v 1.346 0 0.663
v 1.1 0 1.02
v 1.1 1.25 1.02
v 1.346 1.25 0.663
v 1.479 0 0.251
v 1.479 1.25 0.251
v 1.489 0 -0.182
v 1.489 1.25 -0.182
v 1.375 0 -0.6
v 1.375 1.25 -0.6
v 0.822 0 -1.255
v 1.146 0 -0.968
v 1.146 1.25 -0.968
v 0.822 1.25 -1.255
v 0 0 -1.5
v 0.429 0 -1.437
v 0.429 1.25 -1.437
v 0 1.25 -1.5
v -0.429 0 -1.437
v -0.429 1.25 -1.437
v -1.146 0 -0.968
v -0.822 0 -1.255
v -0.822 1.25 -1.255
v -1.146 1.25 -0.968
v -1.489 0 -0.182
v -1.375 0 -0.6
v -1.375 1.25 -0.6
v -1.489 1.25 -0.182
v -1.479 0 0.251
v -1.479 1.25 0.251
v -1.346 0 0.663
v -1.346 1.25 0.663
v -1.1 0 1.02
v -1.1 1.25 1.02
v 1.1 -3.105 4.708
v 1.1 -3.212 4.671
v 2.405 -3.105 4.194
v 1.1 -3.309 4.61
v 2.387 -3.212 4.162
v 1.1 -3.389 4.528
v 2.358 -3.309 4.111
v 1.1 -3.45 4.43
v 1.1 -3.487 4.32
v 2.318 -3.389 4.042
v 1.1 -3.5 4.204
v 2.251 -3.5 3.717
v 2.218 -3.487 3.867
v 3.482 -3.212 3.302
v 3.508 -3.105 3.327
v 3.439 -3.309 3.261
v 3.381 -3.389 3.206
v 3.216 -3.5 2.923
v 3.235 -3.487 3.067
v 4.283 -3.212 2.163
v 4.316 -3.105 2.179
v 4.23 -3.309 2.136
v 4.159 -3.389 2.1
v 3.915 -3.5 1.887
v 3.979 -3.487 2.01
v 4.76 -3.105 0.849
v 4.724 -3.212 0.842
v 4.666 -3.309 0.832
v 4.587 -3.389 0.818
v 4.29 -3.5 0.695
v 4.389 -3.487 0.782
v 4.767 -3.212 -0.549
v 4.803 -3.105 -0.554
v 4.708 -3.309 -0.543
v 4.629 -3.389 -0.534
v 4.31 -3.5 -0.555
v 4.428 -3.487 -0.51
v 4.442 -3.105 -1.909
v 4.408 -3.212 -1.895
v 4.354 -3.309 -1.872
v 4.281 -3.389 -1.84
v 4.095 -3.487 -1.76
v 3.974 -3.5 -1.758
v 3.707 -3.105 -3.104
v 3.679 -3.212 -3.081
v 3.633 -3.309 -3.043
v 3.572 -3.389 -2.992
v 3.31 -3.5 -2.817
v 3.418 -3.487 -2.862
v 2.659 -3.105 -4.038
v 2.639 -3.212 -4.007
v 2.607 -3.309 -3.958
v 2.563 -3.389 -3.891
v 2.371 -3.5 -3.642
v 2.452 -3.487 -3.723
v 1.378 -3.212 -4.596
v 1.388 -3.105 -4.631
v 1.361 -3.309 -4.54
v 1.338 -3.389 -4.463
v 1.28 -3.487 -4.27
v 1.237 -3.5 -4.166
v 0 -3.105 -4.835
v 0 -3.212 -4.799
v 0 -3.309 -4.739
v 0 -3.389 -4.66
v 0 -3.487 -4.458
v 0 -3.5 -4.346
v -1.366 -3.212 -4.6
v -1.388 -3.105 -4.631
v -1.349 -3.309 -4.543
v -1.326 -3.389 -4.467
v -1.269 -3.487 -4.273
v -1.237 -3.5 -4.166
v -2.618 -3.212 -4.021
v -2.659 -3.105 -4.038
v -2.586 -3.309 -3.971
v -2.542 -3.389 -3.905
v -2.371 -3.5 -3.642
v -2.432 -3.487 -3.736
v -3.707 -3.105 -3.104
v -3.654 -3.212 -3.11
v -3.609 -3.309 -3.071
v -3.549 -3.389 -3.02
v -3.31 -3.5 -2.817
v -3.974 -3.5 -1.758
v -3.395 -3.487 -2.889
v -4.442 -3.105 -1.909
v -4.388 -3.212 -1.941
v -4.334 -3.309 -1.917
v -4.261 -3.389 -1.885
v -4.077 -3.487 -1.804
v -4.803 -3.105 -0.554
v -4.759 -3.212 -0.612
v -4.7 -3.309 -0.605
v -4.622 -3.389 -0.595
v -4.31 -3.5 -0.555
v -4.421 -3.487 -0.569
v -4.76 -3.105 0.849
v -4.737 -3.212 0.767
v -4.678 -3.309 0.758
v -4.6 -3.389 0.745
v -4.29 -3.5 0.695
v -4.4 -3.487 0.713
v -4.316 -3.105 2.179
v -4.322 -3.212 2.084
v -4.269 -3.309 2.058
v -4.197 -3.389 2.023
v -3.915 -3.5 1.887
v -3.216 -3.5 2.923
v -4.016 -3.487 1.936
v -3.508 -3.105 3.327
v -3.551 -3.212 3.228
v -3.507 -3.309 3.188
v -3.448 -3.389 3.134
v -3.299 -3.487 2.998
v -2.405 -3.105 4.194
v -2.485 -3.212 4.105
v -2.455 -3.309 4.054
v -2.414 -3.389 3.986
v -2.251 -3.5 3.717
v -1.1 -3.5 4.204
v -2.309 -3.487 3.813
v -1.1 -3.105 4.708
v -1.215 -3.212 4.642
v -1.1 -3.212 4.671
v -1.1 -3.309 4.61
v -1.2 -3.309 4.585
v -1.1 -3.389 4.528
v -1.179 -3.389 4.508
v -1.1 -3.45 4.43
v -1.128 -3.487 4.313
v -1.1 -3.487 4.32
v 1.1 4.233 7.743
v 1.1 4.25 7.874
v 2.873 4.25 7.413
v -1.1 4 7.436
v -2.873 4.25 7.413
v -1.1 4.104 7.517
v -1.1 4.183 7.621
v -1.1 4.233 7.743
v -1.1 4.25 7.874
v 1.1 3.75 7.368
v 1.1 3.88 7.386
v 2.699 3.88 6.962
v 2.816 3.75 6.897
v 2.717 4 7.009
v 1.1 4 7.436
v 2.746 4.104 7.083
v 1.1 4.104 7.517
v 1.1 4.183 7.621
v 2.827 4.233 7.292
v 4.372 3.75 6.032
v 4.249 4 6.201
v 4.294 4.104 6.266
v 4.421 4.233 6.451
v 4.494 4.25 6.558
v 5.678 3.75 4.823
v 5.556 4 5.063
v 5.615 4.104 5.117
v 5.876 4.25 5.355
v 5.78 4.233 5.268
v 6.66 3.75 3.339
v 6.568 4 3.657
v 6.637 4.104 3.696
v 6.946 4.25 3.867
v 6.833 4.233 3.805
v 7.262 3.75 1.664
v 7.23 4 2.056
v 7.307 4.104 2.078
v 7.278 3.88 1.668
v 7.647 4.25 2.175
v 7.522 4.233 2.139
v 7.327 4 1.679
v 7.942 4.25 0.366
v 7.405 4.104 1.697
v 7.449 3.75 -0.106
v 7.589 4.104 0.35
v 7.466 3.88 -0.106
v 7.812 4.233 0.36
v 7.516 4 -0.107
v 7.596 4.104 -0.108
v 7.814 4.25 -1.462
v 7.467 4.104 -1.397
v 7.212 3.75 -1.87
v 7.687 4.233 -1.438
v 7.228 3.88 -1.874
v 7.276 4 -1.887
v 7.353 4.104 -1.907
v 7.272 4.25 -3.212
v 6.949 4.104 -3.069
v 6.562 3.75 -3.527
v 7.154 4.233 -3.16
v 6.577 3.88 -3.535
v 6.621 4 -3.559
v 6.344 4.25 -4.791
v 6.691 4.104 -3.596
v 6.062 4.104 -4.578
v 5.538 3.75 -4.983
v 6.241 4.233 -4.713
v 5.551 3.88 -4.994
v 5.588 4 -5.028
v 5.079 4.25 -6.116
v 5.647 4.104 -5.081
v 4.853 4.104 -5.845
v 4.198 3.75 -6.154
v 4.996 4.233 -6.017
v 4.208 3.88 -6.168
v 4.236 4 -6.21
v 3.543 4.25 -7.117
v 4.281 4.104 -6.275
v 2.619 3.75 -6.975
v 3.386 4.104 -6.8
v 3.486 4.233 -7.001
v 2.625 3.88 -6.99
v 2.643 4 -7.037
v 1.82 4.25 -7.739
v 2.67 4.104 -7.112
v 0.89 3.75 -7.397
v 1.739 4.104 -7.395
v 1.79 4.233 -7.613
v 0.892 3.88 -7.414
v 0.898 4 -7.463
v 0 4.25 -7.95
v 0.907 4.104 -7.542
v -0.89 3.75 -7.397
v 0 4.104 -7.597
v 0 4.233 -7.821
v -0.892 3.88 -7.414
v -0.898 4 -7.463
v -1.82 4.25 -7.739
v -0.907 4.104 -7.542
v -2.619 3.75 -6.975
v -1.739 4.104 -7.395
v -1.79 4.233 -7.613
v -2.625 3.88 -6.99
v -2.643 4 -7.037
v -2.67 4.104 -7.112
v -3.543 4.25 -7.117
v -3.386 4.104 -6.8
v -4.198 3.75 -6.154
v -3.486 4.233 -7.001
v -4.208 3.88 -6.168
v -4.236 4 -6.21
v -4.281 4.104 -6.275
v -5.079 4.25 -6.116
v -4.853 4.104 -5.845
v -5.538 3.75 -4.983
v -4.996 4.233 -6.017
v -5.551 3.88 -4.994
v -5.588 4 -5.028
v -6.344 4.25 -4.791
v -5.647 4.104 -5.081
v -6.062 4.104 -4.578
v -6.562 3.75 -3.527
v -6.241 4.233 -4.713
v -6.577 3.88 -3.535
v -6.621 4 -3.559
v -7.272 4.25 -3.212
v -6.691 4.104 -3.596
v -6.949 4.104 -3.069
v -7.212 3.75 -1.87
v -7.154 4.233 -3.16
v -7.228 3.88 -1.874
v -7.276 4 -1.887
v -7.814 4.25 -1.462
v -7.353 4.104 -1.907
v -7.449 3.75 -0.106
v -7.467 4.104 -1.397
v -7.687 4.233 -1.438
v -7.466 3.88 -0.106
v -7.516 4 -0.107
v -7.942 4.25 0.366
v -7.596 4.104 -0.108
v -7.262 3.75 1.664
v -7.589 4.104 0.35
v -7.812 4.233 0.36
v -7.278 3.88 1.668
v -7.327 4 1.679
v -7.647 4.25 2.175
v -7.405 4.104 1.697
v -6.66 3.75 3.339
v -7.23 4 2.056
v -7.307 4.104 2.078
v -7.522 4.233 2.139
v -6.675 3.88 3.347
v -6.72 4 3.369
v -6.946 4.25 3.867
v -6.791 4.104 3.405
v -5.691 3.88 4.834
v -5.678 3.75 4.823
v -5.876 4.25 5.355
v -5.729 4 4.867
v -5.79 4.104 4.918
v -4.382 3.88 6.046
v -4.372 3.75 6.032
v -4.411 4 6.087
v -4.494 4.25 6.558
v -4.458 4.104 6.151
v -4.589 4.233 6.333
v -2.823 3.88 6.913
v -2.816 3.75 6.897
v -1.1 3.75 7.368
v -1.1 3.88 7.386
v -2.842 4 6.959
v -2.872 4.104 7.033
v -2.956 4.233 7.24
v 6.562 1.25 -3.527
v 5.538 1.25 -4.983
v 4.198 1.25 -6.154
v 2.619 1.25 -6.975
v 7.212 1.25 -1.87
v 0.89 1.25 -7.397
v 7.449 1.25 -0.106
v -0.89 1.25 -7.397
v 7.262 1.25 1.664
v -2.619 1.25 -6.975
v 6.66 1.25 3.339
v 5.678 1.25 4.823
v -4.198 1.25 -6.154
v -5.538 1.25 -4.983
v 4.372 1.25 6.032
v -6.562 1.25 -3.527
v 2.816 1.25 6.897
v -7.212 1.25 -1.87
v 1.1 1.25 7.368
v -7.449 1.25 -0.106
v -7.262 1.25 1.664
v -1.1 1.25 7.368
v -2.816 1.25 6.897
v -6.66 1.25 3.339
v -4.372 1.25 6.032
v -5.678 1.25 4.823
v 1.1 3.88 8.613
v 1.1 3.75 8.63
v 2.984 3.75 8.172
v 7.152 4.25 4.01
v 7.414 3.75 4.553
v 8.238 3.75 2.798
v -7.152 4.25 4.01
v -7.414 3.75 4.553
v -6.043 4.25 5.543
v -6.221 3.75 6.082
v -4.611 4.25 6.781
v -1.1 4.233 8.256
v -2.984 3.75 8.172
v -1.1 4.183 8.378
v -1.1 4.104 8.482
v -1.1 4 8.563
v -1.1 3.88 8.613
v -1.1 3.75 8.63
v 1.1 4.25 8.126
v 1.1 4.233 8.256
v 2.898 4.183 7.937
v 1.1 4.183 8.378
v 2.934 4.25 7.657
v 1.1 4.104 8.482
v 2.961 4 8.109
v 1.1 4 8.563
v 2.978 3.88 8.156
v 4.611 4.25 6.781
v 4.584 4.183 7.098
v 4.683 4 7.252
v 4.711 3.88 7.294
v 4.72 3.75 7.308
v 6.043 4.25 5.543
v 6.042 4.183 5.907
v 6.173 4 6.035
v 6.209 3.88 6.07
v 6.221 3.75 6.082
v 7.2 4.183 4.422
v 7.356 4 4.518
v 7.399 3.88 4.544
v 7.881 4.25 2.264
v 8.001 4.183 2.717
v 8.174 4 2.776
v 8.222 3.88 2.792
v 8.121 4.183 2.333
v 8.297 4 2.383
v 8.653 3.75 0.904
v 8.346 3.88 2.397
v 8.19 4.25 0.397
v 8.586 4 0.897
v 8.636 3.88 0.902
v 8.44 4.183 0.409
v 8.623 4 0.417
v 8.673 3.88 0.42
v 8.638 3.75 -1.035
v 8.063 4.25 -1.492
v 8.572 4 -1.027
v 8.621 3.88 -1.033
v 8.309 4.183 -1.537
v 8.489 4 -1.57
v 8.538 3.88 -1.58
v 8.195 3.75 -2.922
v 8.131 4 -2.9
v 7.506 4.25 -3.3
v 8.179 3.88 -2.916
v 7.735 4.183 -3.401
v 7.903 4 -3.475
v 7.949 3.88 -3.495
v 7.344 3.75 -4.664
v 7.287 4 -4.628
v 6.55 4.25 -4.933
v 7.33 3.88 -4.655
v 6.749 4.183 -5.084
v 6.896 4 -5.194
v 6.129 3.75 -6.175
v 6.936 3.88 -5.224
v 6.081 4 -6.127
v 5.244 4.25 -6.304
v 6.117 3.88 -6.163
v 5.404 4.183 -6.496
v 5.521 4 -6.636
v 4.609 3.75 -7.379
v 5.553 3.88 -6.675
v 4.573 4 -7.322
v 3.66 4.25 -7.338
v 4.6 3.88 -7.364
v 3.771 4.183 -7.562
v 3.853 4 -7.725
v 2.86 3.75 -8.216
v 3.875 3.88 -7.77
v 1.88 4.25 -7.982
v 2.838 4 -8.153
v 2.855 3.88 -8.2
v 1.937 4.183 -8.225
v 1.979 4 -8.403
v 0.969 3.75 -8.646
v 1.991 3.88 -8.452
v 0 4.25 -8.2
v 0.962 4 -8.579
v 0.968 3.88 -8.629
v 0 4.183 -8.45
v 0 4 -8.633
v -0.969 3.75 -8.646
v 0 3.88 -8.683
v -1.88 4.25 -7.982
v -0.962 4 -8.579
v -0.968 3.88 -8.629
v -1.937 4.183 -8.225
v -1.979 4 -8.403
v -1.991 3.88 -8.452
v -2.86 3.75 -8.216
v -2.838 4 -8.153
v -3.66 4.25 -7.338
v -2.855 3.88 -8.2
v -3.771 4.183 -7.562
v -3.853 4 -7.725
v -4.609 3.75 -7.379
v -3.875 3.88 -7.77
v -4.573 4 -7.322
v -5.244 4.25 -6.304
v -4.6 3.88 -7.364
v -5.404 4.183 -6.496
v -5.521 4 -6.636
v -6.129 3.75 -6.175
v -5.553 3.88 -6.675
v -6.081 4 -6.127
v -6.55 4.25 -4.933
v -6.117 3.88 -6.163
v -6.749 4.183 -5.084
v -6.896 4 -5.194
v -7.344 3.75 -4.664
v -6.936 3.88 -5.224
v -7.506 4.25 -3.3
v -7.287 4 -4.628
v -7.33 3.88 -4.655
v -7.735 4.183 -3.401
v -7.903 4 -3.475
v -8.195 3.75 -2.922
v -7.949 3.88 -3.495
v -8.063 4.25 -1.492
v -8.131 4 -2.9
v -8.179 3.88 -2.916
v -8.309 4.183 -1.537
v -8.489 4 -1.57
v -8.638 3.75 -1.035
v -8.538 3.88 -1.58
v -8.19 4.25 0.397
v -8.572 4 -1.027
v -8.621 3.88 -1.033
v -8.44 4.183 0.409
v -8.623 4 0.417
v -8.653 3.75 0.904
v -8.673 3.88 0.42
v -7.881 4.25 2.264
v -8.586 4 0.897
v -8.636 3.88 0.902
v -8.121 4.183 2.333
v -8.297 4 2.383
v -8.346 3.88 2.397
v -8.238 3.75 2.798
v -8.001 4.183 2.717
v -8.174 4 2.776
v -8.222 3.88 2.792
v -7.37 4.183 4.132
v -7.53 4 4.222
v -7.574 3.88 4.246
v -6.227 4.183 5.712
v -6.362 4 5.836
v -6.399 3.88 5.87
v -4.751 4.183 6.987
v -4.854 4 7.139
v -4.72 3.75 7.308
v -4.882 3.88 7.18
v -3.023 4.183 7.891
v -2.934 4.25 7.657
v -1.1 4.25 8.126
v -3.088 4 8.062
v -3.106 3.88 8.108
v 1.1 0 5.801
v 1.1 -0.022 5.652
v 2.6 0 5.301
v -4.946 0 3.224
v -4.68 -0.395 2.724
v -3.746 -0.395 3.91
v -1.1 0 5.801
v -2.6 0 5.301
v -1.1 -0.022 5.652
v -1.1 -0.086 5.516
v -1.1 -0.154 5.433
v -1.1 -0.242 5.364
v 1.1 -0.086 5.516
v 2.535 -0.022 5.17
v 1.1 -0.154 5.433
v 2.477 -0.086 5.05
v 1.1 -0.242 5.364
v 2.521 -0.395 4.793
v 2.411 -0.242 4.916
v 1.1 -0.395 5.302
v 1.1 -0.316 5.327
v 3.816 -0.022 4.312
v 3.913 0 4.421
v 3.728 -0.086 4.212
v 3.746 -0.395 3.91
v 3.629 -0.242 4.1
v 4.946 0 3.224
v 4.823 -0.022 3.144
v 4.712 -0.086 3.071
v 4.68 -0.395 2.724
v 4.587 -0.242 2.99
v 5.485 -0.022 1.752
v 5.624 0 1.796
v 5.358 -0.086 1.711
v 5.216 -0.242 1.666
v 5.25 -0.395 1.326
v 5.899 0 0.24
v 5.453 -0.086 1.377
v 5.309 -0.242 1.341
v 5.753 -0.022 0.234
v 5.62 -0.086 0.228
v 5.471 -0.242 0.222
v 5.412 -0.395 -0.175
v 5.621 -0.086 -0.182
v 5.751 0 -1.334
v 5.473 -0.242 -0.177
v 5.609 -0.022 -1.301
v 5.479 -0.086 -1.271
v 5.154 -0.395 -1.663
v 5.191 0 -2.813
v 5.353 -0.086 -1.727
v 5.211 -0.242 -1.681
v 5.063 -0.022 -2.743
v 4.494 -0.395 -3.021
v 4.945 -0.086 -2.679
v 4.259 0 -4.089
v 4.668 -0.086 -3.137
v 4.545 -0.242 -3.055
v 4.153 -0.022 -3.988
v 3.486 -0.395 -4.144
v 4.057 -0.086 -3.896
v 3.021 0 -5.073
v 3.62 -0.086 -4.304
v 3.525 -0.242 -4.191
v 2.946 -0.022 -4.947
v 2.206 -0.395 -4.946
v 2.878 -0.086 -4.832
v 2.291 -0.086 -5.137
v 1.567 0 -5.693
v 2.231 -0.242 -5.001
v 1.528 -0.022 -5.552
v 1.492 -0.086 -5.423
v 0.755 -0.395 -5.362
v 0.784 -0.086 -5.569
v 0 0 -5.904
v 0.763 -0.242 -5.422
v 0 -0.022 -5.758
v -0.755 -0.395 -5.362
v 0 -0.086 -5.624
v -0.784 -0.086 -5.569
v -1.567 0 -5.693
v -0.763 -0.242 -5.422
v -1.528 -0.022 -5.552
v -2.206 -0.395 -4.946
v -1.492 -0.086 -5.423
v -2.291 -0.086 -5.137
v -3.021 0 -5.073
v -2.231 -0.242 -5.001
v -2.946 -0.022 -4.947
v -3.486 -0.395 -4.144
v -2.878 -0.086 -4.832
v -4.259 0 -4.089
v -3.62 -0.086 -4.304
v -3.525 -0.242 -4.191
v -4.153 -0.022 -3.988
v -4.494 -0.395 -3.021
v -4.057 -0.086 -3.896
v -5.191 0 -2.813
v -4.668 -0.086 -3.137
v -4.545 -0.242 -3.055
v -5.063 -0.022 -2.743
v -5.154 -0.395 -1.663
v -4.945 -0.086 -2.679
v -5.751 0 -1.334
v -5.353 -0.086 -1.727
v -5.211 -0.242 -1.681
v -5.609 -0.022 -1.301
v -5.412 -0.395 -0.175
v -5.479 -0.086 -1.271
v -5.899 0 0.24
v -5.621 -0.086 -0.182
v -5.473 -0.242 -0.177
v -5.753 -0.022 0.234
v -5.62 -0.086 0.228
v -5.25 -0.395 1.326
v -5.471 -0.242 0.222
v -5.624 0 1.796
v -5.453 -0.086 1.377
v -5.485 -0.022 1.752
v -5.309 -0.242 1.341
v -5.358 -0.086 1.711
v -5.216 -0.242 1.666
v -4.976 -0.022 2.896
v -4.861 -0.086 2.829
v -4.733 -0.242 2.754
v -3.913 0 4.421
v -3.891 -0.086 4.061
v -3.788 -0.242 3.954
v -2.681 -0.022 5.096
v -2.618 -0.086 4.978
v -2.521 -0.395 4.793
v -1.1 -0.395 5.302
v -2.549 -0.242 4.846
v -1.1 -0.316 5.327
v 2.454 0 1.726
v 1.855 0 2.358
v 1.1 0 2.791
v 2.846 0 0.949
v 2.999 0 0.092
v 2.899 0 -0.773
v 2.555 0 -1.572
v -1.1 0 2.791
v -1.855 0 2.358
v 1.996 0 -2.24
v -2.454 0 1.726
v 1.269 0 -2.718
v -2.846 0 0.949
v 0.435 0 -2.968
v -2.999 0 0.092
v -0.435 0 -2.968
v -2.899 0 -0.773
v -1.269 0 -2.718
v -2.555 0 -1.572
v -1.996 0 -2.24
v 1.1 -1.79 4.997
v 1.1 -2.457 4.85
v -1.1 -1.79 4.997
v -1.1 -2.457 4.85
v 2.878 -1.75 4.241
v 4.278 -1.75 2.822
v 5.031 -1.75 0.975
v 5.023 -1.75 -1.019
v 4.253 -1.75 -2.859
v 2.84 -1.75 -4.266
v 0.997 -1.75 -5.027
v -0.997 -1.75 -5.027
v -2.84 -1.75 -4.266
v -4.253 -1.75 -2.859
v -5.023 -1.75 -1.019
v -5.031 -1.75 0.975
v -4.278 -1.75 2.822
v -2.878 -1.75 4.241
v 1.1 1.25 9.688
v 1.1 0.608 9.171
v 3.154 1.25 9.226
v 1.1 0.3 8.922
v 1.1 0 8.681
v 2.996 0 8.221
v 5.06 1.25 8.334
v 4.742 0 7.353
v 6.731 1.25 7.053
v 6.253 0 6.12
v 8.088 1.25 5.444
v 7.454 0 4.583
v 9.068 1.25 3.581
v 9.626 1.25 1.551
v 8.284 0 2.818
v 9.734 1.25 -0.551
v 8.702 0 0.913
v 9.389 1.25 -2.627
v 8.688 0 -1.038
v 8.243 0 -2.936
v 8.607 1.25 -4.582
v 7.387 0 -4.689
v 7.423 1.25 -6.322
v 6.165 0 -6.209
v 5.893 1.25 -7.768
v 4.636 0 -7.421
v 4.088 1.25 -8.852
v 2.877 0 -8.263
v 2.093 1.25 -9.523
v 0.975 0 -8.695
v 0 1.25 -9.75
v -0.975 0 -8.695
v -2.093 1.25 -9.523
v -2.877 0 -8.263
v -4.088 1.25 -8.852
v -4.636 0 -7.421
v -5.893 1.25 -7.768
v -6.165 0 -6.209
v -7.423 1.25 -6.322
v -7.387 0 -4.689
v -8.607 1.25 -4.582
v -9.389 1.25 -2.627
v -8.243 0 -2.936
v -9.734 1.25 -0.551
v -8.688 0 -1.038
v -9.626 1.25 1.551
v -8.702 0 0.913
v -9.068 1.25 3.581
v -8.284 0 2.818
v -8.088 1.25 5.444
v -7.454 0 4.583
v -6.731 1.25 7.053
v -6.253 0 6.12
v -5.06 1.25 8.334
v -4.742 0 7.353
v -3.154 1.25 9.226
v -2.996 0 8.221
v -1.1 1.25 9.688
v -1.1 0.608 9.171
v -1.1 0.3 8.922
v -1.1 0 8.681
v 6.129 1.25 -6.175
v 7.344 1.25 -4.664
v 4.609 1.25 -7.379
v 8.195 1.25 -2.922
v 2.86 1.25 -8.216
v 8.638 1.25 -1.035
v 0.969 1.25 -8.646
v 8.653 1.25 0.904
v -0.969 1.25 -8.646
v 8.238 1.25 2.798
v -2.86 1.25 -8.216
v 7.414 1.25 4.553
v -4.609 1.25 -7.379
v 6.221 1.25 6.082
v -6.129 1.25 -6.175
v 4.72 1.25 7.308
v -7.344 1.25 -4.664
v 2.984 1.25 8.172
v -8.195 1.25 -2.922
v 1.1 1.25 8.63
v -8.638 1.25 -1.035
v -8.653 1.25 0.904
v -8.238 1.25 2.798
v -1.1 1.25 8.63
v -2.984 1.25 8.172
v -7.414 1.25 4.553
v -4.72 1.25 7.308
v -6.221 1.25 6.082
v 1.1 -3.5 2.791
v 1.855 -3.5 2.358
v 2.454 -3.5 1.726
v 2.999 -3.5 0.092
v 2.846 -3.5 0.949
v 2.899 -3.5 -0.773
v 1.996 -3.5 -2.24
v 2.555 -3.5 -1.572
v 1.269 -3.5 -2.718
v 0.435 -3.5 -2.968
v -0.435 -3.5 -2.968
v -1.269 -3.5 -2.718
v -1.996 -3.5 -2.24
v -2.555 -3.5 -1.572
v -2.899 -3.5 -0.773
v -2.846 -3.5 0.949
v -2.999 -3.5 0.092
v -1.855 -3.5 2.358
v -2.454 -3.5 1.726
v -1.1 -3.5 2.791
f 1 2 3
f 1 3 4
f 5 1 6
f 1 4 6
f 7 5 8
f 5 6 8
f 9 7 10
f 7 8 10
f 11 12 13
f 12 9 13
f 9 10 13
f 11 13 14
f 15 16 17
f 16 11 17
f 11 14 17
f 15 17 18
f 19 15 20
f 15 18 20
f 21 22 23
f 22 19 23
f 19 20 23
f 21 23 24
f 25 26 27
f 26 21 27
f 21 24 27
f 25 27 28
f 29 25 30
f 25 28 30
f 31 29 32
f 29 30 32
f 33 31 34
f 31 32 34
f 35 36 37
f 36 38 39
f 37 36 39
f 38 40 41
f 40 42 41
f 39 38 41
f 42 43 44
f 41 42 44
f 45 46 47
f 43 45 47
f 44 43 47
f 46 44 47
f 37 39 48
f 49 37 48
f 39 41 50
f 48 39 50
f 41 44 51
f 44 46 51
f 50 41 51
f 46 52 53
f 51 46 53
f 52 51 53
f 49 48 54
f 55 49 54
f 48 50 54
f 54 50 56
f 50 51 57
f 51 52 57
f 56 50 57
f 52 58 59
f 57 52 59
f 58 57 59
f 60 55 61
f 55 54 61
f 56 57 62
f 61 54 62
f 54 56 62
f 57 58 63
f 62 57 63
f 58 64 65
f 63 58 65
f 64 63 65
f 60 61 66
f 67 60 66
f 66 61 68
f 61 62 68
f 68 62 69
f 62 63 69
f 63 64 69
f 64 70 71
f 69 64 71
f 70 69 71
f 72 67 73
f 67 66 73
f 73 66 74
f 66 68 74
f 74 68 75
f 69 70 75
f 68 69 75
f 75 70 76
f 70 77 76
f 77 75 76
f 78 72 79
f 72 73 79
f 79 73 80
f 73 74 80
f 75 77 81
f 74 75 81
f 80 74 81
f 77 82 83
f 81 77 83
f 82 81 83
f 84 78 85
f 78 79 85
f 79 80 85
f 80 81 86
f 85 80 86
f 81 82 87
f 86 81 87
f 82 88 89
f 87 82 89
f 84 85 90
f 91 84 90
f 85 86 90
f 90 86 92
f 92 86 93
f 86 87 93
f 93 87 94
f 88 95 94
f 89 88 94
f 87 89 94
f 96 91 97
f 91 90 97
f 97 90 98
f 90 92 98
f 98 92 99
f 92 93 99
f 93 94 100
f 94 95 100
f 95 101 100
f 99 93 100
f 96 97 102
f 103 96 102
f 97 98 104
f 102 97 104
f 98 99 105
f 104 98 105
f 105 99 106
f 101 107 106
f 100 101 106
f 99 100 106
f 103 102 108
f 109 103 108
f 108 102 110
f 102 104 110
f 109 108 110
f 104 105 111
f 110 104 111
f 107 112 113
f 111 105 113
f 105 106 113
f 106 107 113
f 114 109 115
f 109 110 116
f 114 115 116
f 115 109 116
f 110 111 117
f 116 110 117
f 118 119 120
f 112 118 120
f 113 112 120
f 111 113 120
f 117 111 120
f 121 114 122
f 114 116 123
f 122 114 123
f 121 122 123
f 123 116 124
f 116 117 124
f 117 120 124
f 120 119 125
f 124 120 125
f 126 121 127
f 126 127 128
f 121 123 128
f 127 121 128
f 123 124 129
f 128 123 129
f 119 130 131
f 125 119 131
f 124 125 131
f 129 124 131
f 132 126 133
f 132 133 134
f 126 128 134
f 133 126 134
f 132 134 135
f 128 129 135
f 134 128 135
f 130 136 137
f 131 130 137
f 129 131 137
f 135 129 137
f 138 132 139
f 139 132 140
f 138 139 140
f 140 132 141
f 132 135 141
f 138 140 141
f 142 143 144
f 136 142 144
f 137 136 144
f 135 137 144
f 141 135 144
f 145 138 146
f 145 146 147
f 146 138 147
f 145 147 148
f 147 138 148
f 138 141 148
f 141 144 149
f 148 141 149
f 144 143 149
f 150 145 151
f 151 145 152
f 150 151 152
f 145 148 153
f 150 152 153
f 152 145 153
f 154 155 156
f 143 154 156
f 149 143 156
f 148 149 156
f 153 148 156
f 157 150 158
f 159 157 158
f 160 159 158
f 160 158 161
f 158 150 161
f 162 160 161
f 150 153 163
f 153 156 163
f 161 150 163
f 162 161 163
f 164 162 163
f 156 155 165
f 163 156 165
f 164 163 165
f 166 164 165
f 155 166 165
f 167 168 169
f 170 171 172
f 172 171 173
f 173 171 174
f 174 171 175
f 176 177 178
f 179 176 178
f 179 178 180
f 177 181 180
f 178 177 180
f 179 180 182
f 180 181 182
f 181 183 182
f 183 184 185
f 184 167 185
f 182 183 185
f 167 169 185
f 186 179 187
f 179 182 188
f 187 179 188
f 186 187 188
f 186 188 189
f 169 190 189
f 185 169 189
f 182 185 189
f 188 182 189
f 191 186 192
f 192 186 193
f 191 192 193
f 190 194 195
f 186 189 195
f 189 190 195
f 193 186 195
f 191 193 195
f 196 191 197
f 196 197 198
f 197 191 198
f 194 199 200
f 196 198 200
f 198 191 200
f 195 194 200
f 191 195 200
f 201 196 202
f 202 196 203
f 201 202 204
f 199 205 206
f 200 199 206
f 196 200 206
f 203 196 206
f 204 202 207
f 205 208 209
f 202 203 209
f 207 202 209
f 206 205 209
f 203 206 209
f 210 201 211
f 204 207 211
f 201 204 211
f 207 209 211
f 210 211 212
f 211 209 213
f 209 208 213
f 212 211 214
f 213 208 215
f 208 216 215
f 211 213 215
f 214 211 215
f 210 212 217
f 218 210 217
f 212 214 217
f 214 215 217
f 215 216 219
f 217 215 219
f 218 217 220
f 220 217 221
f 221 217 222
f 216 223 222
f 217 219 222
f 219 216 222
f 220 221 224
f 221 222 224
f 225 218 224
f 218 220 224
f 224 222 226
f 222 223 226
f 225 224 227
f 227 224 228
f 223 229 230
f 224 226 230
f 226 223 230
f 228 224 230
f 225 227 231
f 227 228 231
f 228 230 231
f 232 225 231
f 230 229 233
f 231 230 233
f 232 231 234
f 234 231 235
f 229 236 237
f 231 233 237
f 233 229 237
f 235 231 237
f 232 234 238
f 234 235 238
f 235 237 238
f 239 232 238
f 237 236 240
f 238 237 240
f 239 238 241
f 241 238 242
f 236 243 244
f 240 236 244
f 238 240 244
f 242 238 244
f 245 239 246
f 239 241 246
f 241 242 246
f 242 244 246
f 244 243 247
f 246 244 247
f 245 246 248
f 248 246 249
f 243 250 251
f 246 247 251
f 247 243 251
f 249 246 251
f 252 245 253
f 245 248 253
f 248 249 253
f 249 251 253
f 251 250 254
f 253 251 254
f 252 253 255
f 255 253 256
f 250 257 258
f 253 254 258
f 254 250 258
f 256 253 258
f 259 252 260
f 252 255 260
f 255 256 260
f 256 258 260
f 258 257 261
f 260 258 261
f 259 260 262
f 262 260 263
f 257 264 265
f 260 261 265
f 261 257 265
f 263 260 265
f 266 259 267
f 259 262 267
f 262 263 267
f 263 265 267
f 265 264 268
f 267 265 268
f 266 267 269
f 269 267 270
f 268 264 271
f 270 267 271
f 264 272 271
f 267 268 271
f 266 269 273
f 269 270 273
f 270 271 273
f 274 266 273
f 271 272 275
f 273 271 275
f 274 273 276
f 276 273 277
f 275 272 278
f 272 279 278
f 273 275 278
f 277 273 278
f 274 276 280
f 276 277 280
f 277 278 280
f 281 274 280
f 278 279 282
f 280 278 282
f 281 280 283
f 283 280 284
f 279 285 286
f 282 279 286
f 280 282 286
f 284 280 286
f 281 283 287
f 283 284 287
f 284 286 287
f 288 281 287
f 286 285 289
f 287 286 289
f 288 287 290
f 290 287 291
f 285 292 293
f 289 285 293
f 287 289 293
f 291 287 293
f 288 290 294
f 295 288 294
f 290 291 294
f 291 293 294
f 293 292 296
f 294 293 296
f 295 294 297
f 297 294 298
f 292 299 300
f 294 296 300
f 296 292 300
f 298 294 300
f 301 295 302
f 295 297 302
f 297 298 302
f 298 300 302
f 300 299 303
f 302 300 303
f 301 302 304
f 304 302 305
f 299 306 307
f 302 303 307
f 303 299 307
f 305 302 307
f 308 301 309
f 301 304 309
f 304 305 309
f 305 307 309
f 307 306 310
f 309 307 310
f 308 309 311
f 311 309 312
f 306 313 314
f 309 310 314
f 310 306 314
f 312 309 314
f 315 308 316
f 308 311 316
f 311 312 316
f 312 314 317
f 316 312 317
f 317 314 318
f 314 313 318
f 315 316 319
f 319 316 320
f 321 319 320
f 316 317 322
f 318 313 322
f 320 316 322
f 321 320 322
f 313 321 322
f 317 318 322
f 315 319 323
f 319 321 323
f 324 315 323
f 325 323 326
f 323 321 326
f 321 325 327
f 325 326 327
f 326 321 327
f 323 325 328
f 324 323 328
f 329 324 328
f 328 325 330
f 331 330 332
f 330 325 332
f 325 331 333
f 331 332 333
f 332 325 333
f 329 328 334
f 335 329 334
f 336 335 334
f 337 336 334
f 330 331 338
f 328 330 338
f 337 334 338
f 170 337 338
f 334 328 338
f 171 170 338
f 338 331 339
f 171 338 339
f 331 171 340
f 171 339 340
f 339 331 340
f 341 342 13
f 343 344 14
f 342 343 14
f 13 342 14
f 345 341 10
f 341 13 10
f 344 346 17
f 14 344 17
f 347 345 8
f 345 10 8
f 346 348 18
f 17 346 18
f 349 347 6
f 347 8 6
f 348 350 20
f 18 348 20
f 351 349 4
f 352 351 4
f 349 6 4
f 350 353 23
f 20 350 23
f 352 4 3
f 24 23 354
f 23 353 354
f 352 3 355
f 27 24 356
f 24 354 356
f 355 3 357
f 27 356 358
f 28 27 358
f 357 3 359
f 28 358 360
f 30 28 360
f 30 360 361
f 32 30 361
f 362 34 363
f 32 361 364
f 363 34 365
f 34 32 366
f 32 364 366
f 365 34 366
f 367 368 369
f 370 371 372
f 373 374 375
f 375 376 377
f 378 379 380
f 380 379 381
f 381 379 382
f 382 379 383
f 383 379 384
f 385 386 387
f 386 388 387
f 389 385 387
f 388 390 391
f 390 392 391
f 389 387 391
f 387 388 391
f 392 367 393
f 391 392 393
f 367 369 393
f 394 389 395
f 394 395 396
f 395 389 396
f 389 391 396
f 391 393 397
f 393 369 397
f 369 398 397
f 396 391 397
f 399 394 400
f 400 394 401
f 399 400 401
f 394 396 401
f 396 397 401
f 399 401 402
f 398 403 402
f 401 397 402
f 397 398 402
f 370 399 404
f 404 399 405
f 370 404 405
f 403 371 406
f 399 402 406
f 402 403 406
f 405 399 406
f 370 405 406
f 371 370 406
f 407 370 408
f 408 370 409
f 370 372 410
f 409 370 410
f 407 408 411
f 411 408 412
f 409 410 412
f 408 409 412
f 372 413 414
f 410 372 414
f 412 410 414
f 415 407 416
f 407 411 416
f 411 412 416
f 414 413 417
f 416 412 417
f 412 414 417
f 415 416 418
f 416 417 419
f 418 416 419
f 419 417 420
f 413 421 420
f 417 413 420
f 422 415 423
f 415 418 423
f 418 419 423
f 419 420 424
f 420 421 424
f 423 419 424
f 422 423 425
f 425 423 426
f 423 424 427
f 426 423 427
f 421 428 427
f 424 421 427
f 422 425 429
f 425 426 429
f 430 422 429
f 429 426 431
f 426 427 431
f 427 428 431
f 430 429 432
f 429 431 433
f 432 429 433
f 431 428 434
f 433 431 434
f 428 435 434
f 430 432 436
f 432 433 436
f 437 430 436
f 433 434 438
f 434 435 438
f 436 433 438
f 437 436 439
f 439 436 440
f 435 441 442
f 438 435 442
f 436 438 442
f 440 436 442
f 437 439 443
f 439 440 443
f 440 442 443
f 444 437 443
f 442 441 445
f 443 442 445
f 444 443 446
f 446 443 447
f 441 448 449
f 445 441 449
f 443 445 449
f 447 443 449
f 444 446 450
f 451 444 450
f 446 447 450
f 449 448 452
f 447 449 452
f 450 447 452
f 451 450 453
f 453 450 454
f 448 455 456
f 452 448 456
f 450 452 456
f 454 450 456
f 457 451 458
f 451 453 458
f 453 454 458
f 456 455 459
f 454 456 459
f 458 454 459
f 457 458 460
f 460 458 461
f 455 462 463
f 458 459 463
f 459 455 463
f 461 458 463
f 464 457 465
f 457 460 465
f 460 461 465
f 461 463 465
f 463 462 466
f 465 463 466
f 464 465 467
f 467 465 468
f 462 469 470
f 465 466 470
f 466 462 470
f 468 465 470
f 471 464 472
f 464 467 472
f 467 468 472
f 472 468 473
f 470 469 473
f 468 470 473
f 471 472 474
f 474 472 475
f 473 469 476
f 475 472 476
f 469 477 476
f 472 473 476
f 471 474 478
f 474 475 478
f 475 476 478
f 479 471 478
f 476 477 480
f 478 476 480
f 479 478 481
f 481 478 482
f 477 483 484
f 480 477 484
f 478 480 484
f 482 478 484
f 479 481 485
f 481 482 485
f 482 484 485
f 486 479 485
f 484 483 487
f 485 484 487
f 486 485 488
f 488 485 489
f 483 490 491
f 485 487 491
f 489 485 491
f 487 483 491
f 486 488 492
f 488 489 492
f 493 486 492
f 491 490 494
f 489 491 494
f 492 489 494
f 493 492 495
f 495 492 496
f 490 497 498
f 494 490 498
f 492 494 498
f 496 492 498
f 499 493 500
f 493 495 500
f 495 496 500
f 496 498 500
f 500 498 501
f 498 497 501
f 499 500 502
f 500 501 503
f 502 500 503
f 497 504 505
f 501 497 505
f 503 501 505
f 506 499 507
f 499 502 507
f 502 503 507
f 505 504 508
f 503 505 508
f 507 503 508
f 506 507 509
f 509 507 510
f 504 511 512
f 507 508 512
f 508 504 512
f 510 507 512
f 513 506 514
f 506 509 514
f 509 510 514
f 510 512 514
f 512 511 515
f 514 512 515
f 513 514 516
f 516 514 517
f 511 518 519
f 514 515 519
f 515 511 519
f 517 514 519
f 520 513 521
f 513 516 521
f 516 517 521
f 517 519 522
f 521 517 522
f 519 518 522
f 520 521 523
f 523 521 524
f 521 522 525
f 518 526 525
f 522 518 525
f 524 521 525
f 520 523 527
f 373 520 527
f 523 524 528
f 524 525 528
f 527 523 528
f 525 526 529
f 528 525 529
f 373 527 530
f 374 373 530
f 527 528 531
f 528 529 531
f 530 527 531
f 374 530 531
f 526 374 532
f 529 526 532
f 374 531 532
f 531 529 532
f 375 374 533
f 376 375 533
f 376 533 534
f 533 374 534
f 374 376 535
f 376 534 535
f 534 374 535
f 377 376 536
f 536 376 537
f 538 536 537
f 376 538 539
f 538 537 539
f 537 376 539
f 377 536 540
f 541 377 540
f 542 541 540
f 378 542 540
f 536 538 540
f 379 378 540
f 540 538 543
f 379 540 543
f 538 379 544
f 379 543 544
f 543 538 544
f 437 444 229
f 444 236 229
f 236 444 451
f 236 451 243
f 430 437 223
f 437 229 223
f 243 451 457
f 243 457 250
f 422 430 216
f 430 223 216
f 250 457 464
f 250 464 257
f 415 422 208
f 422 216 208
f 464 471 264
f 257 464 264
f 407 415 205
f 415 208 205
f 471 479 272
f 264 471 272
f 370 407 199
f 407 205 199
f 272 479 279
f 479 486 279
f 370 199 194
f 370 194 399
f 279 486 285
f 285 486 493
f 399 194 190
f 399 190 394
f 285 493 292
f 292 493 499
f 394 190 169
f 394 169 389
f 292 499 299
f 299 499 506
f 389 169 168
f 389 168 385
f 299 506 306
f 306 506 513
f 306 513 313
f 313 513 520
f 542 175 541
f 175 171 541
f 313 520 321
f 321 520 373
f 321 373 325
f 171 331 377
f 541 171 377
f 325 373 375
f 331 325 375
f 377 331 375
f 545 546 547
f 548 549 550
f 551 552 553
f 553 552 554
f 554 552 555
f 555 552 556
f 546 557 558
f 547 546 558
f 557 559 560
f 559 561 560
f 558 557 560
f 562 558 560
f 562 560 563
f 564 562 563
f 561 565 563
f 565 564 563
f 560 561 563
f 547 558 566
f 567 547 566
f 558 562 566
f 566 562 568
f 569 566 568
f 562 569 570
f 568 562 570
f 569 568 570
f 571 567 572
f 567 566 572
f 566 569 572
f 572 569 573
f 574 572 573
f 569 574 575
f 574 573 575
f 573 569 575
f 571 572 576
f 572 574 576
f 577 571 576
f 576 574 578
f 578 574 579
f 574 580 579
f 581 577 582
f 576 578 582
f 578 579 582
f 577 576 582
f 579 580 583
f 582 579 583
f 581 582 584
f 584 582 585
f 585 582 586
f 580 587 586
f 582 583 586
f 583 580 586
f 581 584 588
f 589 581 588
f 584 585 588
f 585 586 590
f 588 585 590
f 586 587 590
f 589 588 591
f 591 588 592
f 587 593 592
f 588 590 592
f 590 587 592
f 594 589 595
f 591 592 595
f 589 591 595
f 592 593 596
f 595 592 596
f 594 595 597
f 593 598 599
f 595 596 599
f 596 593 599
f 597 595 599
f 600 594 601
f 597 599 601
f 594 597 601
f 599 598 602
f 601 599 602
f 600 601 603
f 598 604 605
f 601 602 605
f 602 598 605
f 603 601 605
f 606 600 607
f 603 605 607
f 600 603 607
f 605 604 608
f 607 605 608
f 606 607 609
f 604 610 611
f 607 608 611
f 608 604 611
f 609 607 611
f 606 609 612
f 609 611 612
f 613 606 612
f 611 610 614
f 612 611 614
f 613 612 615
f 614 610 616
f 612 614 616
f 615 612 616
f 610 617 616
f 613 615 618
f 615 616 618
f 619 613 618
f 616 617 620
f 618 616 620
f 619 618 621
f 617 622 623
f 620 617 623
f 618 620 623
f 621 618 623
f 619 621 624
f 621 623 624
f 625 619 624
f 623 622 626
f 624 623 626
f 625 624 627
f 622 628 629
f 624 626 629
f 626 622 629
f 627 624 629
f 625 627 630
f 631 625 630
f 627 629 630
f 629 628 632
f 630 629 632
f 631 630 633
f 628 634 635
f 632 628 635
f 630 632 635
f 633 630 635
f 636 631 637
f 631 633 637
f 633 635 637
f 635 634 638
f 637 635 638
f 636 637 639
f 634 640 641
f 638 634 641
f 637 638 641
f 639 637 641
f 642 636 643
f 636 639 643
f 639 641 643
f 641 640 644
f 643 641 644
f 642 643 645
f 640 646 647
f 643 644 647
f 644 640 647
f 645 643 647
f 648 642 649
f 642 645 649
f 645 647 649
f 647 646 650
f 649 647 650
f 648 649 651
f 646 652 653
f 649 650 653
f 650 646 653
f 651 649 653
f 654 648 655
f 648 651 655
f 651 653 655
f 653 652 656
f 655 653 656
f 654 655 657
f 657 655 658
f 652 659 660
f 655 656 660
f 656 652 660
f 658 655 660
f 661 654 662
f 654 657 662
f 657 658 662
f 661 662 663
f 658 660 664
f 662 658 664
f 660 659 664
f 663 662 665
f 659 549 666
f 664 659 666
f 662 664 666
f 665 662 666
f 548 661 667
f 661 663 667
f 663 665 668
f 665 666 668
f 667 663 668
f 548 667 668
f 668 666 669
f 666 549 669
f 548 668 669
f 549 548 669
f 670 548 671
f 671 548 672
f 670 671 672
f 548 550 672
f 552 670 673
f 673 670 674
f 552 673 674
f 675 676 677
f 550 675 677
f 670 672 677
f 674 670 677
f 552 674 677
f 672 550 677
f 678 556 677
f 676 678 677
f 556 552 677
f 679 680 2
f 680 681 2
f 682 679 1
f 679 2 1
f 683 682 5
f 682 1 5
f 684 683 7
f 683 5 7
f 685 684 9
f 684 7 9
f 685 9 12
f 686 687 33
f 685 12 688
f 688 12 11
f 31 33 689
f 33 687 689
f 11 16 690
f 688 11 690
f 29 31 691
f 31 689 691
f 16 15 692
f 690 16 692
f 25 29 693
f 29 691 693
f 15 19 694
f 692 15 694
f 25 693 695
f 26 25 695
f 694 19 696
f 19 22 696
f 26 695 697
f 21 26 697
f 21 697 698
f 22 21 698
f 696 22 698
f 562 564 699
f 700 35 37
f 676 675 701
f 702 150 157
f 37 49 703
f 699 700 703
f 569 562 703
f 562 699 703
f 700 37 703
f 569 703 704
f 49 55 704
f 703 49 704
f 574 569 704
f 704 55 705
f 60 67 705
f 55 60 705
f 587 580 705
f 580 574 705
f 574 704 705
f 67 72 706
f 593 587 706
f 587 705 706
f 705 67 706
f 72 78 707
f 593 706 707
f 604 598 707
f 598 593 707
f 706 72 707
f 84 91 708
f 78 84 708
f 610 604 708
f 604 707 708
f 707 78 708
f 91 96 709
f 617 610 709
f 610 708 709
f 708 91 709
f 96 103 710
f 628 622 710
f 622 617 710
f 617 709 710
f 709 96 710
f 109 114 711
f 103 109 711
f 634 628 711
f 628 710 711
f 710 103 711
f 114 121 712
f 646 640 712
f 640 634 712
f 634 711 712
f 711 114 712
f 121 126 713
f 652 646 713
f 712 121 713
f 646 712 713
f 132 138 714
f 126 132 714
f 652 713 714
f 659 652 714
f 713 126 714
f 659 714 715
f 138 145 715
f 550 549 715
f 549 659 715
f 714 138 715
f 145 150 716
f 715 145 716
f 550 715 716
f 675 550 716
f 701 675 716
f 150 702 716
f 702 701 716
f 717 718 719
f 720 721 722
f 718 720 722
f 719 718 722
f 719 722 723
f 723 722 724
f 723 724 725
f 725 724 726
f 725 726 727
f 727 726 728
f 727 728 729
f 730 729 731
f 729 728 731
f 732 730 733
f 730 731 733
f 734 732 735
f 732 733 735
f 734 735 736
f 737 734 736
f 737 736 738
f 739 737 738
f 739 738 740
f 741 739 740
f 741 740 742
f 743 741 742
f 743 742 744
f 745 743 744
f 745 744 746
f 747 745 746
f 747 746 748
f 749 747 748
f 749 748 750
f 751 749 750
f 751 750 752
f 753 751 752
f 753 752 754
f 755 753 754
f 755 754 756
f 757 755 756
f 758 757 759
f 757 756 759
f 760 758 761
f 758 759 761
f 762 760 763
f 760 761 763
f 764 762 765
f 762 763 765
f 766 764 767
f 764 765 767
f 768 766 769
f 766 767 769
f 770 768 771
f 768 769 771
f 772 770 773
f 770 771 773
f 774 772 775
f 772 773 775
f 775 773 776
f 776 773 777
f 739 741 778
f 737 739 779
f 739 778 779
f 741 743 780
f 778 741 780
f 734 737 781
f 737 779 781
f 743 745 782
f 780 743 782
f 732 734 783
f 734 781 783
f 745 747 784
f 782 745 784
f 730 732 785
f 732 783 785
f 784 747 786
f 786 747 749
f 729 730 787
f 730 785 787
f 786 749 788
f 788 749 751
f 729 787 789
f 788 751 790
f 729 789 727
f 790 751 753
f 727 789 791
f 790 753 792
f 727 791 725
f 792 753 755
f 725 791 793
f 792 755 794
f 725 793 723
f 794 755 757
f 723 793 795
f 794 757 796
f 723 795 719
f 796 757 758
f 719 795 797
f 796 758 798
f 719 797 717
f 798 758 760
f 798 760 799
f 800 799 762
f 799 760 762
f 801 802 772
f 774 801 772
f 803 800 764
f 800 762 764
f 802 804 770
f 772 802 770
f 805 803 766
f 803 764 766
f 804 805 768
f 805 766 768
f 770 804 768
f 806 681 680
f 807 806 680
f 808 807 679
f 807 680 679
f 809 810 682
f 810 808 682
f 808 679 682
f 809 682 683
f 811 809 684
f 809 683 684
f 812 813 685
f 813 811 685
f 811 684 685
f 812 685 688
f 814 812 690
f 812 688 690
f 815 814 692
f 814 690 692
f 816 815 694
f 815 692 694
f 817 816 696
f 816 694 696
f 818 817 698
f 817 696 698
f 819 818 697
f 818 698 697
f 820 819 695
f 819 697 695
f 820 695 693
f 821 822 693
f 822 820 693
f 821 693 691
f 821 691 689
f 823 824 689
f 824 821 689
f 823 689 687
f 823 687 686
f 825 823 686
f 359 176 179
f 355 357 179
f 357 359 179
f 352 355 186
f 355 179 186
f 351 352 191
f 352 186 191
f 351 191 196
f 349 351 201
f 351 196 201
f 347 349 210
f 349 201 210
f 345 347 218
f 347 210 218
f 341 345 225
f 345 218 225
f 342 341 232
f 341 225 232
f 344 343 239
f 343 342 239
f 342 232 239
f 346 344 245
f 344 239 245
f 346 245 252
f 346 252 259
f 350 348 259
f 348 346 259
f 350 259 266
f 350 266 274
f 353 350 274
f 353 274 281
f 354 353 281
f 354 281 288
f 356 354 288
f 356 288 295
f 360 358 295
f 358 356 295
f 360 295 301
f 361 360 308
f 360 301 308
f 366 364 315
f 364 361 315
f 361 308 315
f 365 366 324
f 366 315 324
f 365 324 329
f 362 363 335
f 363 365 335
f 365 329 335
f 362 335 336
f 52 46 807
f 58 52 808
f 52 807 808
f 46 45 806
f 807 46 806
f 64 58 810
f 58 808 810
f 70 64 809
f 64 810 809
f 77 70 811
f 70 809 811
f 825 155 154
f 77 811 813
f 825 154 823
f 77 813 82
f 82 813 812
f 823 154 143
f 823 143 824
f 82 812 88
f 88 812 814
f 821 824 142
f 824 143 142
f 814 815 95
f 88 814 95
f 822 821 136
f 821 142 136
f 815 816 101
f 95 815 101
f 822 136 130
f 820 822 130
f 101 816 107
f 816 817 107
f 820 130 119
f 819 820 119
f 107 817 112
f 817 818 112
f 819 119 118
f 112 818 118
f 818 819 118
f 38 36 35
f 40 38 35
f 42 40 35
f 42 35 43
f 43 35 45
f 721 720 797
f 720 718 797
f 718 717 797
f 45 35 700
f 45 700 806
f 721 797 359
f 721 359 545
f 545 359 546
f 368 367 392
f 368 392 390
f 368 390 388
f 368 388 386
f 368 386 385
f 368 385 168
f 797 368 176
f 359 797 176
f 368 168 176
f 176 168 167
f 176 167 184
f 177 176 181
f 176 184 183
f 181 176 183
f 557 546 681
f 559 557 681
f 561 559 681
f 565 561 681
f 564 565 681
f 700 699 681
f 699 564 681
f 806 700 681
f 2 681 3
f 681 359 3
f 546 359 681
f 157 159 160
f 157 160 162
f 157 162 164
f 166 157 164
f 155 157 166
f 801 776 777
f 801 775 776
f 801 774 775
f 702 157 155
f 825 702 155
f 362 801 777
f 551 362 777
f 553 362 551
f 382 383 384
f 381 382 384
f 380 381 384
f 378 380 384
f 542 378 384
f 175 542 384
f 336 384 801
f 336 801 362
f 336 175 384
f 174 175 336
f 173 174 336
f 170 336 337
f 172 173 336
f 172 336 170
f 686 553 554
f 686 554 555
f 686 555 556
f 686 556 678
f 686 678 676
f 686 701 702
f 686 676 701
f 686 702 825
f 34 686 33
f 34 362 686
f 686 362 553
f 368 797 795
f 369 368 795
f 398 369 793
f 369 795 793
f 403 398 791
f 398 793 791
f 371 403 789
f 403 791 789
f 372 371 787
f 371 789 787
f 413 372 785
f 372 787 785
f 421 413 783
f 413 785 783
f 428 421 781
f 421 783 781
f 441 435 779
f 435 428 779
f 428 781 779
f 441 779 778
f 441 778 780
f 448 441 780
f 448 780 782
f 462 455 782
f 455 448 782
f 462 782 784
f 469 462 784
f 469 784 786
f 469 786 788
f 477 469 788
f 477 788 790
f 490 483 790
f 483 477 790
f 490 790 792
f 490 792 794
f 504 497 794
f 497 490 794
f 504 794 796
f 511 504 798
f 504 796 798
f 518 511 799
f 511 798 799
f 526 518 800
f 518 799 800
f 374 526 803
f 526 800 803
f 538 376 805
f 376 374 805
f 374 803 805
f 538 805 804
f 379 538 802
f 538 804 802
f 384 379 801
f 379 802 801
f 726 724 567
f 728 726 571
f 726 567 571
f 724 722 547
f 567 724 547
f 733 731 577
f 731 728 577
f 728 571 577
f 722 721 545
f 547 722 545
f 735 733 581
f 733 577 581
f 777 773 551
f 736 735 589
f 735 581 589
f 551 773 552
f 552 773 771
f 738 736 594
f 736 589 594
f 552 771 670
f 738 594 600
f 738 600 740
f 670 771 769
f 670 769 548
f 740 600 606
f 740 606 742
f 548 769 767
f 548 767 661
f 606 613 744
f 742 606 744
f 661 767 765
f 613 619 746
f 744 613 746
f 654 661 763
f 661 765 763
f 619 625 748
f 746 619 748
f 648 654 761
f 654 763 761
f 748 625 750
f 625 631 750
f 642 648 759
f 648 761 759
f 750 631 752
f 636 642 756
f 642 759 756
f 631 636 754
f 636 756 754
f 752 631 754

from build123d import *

# Parameters (mm, degrees)
FILLET1_R          = 0.5
SKETCH2_W          = 2.2
SKETCH2_H          = 12.020991071
CUT_EXTRUDE1_DEPTH = 5


with BuildPart() as part:
    # Sketch1 → Revolve1 (revolve)
    with BuildSketch(Plane.XY, mode=Mode.PRIVATE) as revolve1_sk:
        Polygon((1.5, 0), (1.5, 1.25), (7.45, 1.25), (7.45, 4.25), (8.7, 4.25), (8.7, 1.25), (9.75, 1.25), (8.75, 0), (5.5, 0), (4.75, -3.5), (3, -3.5), (3, 0), align=None)
    revolve(revolve1_sk.sketch.rotate(Axis((0, -16.601859786, 0), (0, 1, 0)), 90), axis=Axis((0, -16.601859786, 0), (0, 1, 0)))

    # Fillet1
    fillet1_edges = [part.edges().sort_by_distance(p)[0] for p in [
        (0, 4.25, 8.7),
        (0, 4.25, 7.45),
        (0, -3.5, 4.75),
        (0, 0, 5.5),
    ]]
    fillet(fillet1_edges, radius=FILLET1_R)

    # Sketch2 → Cut-Extrude1 (cut, symmetric)
    with BuildSketch(Plane(origin=(0, 0, 0), x_dir=(1, 0, 0), z_dir=(0, 1, 0))):
        with Locations((0, -6.010495536)):
            Rectangle(SKETCH2_W, SKETCH2_H)
    extrude(amount=CUT_EXTRUDE1_DEPTH, both=True, mode=Mode.SUBTRACT)


solid = part.part
